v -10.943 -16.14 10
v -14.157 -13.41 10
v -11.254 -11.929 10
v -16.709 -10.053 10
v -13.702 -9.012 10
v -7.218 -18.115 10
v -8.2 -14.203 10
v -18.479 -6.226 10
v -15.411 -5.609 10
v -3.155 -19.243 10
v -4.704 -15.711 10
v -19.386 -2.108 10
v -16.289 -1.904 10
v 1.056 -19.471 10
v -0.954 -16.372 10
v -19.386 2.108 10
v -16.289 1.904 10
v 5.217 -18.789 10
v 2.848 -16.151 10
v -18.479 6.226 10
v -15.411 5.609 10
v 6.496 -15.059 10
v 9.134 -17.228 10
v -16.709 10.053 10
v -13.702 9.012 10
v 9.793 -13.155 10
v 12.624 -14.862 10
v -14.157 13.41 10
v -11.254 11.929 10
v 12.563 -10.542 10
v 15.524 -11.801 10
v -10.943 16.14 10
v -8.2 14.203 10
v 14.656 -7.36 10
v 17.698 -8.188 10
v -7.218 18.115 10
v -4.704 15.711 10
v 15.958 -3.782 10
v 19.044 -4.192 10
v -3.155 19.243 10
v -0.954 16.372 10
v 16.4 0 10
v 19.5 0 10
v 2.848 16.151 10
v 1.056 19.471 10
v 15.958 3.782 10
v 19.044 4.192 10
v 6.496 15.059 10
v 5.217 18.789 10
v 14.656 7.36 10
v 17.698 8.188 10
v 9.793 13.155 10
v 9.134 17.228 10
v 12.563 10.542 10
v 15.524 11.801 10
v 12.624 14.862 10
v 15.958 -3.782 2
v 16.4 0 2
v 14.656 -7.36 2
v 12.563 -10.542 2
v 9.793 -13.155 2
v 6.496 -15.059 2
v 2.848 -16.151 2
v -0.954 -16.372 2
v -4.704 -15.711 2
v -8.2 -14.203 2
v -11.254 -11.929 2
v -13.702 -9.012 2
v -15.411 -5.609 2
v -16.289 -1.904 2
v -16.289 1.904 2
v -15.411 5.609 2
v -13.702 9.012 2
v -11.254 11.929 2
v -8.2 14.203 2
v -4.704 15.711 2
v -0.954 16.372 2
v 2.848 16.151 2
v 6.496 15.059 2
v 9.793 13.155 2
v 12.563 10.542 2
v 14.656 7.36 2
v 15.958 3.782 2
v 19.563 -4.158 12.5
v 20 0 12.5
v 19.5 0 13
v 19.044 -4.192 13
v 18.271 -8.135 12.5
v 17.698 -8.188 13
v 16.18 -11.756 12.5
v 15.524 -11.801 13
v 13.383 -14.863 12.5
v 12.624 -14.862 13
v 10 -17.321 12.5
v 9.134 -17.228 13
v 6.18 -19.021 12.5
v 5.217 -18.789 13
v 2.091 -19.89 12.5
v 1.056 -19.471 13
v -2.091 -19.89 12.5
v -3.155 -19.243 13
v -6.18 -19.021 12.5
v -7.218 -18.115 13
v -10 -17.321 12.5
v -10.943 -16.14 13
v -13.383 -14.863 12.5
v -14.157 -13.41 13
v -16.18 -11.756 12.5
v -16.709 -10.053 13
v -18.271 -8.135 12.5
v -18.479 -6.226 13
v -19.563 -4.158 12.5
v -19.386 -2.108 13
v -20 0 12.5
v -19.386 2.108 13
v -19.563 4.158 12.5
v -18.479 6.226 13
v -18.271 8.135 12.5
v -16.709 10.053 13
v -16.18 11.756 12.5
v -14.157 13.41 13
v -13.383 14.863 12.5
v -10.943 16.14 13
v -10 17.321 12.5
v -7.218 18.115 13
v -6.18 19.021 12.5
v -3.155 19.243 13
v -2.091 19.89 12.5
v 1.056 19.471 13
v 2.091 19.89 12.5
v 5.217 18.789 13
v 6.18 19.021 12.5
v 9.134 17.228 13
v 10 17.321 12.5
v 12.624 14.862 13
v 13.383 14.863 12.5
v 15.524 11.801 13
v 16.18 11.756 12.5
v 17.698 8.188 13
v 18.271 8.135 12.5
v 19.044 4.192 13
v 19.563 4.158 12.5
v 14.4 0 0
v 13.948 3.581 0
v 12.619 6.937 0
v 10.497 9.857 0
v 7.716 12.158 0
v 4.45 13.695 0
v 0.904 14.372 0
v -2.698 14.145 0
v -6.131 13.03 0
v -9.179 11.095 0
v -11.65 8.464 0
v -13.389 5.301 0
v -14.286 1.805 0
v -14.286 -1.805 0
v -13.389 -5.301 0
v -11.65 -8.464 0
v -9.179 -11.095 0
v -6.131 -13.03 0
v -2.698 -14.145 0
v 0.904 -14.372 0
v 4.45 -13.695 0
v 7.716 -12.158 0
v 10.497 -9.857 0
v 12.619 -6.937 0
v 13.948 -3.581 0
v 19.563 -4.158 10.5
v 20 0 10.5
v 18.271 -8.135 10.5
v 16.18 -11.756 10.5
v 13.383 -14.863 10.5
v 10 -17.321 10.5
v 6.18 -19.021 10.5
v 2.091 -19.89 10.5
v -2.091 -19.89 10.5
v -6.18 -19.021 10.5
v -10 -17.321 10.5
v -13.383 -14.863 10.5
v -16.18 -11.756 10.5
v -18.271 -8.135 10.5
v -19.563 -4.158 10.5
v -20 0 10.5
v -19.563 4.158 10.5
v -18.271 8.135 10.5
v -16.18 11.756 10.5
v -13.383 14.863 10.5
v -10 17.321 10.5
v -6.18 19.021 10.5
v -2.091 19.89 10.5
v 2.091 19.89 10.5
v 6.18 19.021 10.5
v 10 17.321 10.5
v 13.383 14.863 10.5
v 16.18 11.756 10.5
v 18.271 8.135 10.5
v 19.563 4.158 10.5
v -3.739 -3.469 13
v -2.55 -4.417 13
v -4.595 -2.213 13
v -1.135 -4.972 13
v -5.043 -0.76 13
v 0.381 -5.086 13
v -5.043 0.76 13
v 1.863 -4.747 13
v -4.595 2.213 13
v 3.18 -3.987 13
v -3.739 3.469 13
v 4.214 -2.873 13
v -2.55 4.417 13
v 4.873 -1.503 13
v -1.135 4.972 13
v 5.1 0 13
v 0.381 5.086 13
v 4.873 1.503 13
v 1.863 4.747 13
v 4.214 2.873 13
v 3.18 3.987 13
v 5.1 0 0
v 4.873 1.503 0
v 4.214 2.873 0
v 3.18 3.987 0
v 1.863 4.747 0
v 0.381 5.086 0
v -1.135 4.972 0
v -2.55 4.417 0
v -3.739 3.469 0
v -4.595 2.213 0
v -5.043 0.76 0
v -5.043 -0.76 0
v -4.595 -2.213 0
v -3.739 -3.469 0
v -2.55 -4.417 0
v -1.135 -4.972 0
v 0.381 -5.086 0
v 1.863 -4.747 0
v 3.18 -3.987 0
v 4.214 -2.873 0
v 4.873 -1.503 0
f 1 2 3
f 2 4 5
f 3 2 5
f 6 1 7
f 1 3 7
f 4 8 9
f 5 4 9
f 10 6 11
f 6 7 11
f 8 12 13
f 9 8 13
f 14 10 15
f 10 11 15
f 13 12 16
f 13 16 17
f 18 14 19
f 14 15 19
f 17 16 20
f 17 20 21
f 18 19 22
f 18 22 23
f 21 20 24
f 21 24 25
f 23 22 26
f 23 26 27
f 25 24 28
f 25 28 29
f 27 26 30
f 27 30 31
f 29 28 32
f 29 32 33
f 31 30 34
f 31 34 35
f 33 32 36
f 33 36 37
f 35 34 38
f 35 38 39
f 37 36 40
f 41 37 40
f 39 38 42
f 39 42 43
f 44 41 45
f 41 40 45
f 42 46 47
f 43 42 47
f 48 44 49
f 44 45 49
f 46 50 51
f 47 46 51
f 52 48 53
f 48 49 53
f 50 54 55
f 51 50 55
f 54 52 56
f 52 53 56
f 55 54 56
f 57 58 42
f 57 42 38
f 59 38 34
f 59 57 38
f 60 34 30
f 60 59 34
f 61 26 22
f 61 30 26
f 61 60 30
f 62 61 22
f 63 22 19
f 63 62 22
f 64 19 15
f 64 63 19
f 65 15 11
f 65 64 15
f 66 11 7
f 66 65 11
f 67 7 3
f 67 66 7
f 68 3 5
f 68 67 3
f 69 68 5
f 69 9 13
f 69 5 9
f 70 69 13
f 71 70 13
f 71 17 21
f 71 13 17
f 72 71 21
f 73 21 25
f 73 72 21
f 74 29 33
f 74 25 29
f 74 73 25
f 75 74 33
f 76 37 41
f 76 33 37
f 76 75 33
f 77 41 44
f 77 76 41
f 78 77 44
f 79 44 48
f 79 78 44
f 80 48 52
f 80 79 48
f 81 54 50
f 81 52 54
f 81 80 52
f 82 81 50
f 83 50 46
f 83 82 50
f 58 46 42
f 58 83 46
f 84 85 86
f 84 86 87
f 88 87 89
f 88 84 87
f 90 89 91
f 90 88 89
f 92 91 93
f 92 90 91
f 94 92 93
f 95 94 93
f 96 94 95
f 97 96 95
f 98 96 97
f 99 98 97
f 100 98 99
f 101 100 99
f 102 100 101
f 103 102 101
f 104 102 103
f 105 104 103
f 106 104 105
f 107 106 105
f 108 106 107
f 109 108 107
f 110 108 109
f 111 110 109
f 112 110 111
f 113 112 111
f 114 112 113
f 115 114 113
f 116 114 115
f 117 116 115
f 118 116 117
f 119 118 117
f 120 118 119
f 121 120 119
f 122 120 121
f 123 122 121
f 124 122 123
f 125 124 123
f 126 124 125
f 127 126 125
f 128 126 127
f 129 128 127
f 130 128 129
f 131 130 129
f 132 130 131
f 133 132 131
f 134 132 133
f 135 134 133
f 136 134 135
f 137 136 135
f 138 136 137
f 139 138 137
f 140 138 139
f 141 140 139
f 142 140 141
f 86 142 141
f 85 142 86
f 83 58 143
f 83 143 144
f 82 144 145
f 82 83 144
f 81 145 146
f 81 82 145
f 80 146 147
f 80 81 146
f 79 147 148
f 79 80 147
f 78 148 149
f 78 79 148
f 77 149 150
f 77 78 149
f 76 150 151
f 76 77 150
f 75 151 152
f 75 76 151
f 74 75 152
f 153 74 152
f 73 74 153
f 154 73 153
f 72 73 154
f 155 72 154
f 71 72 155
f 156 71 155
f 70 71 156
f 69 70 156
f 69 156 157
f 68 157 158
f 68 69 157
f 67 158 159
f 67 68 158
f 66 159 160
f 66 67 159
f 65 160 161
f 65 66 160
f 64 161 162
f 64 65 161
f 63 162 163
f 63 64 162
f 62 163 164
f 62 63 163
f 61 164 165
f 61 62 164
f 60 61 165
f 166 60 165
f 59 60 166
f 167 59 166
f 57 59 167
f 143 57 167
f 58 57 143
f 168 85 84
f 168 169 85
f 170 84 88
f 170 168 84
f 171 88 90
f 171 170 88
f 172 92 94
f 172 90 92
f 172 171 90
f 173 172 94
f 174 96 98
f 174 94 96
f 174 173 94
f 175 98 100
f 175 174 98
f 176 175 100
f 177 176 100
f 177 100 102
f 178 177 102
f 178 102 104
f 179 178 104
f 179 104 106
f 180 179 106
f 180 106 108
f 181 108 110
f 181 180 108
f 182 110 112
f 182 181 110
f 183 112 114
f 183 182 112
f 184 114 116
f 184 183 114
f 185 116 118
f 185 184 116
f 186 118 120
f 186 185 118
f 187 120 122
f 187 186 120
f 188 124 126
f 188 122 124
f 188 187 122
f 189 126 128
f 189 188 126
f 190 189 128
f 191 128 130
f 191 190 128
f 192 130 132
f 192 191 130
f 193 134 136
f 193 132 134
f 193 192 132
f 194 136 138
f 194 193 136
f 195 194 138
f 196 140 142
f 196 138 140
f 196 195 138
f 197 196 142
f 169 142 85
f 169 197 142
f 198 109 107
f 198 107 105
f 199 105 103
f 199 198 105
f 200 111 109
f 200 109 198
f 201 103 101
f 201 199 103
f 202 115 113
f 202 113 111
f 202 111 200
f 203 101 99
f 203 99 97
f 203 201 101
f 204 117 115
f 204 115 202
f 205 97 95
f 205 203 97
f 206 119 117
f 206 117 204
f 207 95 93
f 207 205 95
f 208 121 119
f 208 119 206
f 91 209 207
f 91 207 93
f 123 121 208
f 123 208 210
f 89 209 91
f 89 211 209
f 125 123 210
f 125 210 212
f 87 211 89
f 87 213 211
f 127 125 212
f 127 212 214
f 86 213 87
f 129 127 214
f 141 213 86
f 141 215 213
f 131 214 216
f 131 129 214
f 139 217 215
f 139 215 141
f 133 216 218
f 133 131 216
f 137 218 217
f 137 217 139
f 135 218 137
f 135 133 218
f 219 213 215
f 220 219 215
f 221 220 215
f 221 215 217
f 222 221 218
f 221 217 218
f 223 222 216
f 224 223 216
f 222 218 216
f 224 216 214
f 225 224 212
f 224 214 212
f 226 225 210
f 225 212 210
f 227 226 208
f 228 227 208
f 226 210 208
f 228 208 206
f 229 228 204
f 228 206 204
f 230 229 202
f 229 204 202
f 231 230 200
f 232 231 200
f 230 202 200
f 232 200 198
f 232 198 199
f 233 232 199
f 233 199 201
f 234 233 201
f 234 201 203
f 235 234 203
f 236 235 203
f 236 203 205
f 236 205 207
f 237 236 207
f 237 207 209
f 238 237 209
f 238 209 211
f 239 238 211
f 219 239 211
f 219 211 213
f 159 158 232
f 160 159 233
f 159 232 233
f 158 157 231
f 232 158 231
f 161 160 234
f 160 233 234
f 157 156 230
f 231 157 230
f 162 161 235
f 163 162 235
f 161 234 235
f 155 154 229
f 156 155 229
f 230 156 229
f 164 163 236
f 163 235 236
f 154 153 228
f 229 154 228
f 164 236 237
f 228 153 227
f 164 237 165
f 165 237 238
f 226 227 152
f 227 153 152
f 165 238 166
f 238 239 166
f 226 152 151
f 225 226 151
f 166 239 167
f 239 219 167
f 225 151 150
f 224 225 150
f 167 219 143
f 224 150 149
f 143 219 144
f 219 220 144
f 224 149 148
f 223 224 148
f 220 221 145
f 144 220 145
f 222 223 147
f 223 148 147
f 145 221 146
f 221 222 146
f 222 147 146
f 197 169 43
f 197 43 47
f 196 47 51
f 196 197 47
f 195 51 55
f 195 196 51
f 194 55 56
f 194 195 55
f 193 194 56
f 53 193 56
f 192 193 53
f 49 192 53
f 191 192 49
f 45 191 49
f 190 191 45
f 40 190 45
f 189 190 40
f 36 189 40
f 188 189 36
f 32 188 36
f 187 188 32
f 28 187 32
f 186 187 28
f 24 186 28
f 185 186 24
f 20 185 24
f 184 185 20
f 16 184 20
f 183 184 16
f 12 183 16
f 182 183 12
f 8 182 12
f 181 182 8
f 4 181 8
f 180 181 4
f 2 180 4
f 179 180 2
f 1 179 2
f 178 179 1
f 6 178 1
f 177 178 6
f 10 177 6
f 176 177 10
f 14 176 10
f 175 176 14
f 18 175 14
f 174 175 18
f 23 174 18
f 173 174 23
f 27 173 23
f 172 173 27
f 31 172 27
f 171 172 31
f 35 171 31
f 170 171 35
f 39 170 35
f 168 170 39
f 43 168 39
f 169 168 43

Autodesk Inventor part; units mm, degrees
ref_plane "YZ Plane" through (0, 0, 0) normal (1, 0, 0) x (0, 1, 0)
ref_plane "XZ Plane" through (0, 0, 0) normal (0, 1, 0) x (-1, 0, 0)
ref_plane "XY Plane" through (0, 0, 0) normal (0, 0, 1) x (1, 0, 0)
sketch "スケッチ1" plane through (0, 0, 0) normal (0, 0, 1) x (1, 0, 0)
  circle A0 centre (0, 0) radius 16.4
  dimension "d0" = 32.8
extrude "押し出し1" add sketch "スケッチ1" along normal blind 10
sketch "スケッチ2" plane through (0, 0, 10) normal (0, 0, 1) x (1, 0, 0)
  circle A0 centre (0, 0) radius 16.4 projected
  circle A1 centre (0, 0) radius 20
  dimension "d3" = 40
extrude "押し出し2" add sketch "スケッチ2" along normal blind 3 contours A0 | A1
chamfer "面取り1" distance 2 angle 45 1 edges at (-16.4, 0, 0)
chamfer "面取り2" distance 0.5 angle 45 2 edges at (-20, 0, 13) (-20, 0, 10)
sketch "スケッチ3" plane through (0, 0, 13) normal (0, 0, 1) x (1, 0, 0)
  circle A0 centre (0, 0) radius 19.5 projected
  circle A1 centre (0, 0) radius 5.1
  dimension "d12" = 10.2
extrude "押し出し3" cut sketch "スケッチ3" against normal through all contours A1
properties part number "Print_Parts_K" material "PC/ABS プラスチック"
